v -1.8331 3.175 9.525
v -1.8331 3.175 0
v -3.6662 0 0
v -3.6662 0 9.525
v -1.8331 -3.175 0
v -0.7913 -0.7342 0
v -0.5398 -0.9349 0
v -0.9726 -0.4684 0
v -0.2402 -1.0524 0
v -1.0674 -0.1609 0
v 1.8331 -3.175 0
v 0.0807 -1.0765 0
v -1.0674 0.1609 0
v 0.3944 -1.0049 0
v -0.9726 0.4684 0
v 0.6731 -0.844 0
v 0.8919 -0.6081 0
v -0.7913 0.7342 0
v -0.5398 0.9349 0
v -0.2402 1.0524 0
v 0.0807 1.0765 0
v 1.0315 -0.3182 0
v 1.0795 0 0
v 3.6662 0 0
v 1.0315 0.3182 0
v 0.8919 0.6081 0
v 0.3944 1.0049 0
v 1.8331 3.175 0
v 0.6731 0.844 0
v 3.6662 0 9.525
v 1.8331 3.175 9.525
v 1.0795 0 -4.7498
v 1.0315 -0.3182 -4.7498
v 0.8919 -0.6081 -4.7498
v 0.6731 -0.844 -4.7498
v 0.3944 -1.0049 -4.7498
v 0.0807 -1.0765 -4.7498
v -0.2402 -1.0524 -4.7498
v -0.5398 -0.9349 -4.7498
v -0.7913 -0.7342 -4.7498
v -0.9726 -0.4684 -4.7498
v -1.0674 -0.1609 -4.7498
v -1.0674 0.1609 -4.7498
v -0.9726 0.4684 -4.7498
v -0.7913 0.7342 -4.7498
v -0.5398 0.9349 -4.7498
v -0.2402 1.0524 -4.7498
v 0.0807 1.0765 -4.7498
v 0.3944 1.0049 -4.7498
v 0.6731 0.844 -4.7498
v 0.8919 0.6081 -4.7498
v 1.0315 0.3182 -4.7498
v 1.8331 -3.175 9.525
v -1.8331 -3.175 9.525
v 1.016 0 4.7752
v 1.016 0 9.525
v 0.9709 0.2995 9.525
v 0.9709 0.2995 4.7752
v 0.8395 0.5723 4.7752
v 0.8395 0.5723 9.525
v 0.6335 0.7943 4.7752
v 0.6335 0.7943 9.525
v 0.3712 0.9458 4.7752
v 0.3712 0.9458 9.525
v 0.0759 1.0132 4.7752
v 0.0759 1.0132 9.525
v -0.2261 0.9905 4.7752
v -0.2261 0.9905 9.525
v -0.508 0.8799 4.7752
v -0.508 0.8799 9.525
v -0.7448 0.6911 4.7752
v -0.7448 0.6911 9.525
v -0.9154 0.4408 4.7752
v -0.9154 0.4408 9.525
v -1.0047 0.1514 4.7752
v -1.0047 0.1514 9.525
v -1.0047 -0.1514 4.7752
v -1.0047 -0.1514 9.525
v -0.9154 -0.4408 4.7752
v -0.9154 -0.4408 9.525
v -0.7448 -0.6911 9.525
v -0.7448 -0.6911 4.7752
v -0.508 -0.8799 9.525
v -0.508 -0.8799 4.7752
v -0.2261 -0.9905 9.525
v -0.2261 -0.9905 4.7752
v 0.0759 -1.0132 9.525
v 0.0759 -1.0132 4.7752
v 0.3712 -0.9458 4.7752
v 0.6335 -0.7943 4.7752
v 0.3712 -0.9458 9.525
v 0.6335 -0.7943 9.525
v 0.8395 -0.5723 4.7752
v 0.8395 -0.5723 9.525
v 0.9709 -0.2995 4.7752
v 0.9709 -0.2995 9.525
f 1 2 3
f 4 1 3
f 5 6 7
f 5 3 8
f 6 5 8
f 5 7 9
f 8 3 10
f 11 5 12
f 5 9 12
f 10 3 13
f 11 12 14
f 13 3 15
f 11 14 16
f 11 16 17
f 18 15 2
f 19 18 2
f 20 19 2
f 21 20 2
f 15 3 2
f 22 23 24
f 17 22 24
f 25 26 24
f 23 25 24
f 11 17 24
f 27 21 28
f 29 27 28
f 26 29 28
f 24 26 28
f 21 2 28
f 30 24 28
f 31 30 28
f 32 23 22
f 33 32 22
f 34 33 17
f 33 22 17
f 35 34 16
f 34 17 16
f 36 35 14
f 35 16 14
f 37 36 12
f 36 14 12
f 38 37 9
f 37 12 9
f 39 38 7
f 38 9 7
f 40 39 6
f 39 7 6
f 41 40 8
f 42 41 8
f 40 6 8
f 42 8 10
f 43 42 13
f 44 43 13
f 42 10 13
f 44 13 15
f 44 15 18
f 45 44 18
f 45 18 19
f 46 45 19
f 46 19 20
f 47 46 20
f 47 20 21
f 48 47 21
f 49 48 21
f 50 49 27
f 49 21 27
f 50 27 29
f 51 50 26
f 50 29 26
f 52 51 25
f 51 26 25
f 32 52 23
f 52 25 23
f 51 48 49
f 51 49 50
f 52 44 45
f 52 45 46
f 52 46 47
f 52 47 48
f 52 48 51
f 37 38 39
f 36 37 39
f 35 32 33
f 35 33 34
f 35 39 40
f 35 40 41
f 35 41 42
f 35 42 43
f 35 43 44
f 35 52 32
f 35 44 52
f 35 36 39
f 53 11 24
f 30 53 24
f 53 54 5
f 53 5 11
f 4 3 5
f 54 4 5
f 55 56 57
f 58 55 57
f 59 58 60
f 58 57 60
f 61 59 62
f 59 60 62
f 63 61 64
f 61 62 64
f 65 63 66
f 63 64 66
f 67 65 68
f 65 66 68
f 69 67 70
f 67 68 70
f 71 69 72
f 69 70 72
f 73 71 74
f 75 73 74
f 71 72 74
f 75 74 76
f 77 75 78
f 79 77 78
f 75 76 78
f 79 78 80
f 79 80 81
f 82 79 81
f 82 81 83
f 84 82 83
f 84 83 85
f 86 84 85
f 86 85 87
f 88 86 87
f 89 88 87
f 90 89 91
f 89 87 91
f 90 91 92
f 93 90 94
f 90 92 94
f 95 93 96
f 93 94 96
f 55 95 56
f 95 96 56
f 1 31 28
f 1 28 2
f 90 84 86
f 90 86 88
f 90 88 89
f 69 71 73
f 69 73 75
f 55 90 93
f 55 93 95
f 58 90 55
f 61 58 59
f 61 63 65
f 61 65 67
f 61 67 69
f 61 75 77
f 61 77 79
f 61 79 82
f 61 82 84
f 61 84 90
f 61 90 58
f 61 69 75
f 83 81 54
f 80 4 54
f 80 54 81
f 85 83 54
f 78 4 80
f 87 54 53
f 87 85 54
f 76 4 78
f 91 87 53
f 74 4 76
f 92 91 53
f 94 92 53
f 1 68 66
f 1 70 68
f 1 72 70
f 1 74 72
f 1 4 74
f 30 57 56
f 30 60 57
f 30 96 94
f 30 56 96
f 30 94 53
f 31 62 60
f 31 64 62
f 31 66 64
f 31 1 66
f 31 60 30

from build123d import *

# Parameters (mm, degrees)
F1_DEPTH = 9.525
F2_R     = 1.0795
F3_DEPTH = 4.7498
F4_R     = 1.016
F5_DEPTH = 4.7498


with BuildPart() as f1:
    # F0 (on Top) → F1 (new body)
    with BuildSketch(Plane.XY):
        Polygon((1.833087, -3.175), (3.666174, 0), (1.833087, 3.175), (-1.833087, 3.175), (-3.666174, 0), (-1.833087, -3.175), align=None)
    extrude(amount=F1_DEPTH)

    # F2 (on face) → F3 (join)
    with BuildSketch(Plane(origin=(0, 0, 0), x_dir=(1, 0, 0), z_dir=(0, 0, -1))):
        Circle(F2_R)
    extrude(amount=F3_DEPTH)

    # F4 (on face) → F5 (cut)
    with BuildSketch(Plane.XY.offset(9.525)):
        Circle(F4_R)
    extrude(amount=-F5_DEPTH, mode=Mode.SUBTRACT)


solid = f1.part
